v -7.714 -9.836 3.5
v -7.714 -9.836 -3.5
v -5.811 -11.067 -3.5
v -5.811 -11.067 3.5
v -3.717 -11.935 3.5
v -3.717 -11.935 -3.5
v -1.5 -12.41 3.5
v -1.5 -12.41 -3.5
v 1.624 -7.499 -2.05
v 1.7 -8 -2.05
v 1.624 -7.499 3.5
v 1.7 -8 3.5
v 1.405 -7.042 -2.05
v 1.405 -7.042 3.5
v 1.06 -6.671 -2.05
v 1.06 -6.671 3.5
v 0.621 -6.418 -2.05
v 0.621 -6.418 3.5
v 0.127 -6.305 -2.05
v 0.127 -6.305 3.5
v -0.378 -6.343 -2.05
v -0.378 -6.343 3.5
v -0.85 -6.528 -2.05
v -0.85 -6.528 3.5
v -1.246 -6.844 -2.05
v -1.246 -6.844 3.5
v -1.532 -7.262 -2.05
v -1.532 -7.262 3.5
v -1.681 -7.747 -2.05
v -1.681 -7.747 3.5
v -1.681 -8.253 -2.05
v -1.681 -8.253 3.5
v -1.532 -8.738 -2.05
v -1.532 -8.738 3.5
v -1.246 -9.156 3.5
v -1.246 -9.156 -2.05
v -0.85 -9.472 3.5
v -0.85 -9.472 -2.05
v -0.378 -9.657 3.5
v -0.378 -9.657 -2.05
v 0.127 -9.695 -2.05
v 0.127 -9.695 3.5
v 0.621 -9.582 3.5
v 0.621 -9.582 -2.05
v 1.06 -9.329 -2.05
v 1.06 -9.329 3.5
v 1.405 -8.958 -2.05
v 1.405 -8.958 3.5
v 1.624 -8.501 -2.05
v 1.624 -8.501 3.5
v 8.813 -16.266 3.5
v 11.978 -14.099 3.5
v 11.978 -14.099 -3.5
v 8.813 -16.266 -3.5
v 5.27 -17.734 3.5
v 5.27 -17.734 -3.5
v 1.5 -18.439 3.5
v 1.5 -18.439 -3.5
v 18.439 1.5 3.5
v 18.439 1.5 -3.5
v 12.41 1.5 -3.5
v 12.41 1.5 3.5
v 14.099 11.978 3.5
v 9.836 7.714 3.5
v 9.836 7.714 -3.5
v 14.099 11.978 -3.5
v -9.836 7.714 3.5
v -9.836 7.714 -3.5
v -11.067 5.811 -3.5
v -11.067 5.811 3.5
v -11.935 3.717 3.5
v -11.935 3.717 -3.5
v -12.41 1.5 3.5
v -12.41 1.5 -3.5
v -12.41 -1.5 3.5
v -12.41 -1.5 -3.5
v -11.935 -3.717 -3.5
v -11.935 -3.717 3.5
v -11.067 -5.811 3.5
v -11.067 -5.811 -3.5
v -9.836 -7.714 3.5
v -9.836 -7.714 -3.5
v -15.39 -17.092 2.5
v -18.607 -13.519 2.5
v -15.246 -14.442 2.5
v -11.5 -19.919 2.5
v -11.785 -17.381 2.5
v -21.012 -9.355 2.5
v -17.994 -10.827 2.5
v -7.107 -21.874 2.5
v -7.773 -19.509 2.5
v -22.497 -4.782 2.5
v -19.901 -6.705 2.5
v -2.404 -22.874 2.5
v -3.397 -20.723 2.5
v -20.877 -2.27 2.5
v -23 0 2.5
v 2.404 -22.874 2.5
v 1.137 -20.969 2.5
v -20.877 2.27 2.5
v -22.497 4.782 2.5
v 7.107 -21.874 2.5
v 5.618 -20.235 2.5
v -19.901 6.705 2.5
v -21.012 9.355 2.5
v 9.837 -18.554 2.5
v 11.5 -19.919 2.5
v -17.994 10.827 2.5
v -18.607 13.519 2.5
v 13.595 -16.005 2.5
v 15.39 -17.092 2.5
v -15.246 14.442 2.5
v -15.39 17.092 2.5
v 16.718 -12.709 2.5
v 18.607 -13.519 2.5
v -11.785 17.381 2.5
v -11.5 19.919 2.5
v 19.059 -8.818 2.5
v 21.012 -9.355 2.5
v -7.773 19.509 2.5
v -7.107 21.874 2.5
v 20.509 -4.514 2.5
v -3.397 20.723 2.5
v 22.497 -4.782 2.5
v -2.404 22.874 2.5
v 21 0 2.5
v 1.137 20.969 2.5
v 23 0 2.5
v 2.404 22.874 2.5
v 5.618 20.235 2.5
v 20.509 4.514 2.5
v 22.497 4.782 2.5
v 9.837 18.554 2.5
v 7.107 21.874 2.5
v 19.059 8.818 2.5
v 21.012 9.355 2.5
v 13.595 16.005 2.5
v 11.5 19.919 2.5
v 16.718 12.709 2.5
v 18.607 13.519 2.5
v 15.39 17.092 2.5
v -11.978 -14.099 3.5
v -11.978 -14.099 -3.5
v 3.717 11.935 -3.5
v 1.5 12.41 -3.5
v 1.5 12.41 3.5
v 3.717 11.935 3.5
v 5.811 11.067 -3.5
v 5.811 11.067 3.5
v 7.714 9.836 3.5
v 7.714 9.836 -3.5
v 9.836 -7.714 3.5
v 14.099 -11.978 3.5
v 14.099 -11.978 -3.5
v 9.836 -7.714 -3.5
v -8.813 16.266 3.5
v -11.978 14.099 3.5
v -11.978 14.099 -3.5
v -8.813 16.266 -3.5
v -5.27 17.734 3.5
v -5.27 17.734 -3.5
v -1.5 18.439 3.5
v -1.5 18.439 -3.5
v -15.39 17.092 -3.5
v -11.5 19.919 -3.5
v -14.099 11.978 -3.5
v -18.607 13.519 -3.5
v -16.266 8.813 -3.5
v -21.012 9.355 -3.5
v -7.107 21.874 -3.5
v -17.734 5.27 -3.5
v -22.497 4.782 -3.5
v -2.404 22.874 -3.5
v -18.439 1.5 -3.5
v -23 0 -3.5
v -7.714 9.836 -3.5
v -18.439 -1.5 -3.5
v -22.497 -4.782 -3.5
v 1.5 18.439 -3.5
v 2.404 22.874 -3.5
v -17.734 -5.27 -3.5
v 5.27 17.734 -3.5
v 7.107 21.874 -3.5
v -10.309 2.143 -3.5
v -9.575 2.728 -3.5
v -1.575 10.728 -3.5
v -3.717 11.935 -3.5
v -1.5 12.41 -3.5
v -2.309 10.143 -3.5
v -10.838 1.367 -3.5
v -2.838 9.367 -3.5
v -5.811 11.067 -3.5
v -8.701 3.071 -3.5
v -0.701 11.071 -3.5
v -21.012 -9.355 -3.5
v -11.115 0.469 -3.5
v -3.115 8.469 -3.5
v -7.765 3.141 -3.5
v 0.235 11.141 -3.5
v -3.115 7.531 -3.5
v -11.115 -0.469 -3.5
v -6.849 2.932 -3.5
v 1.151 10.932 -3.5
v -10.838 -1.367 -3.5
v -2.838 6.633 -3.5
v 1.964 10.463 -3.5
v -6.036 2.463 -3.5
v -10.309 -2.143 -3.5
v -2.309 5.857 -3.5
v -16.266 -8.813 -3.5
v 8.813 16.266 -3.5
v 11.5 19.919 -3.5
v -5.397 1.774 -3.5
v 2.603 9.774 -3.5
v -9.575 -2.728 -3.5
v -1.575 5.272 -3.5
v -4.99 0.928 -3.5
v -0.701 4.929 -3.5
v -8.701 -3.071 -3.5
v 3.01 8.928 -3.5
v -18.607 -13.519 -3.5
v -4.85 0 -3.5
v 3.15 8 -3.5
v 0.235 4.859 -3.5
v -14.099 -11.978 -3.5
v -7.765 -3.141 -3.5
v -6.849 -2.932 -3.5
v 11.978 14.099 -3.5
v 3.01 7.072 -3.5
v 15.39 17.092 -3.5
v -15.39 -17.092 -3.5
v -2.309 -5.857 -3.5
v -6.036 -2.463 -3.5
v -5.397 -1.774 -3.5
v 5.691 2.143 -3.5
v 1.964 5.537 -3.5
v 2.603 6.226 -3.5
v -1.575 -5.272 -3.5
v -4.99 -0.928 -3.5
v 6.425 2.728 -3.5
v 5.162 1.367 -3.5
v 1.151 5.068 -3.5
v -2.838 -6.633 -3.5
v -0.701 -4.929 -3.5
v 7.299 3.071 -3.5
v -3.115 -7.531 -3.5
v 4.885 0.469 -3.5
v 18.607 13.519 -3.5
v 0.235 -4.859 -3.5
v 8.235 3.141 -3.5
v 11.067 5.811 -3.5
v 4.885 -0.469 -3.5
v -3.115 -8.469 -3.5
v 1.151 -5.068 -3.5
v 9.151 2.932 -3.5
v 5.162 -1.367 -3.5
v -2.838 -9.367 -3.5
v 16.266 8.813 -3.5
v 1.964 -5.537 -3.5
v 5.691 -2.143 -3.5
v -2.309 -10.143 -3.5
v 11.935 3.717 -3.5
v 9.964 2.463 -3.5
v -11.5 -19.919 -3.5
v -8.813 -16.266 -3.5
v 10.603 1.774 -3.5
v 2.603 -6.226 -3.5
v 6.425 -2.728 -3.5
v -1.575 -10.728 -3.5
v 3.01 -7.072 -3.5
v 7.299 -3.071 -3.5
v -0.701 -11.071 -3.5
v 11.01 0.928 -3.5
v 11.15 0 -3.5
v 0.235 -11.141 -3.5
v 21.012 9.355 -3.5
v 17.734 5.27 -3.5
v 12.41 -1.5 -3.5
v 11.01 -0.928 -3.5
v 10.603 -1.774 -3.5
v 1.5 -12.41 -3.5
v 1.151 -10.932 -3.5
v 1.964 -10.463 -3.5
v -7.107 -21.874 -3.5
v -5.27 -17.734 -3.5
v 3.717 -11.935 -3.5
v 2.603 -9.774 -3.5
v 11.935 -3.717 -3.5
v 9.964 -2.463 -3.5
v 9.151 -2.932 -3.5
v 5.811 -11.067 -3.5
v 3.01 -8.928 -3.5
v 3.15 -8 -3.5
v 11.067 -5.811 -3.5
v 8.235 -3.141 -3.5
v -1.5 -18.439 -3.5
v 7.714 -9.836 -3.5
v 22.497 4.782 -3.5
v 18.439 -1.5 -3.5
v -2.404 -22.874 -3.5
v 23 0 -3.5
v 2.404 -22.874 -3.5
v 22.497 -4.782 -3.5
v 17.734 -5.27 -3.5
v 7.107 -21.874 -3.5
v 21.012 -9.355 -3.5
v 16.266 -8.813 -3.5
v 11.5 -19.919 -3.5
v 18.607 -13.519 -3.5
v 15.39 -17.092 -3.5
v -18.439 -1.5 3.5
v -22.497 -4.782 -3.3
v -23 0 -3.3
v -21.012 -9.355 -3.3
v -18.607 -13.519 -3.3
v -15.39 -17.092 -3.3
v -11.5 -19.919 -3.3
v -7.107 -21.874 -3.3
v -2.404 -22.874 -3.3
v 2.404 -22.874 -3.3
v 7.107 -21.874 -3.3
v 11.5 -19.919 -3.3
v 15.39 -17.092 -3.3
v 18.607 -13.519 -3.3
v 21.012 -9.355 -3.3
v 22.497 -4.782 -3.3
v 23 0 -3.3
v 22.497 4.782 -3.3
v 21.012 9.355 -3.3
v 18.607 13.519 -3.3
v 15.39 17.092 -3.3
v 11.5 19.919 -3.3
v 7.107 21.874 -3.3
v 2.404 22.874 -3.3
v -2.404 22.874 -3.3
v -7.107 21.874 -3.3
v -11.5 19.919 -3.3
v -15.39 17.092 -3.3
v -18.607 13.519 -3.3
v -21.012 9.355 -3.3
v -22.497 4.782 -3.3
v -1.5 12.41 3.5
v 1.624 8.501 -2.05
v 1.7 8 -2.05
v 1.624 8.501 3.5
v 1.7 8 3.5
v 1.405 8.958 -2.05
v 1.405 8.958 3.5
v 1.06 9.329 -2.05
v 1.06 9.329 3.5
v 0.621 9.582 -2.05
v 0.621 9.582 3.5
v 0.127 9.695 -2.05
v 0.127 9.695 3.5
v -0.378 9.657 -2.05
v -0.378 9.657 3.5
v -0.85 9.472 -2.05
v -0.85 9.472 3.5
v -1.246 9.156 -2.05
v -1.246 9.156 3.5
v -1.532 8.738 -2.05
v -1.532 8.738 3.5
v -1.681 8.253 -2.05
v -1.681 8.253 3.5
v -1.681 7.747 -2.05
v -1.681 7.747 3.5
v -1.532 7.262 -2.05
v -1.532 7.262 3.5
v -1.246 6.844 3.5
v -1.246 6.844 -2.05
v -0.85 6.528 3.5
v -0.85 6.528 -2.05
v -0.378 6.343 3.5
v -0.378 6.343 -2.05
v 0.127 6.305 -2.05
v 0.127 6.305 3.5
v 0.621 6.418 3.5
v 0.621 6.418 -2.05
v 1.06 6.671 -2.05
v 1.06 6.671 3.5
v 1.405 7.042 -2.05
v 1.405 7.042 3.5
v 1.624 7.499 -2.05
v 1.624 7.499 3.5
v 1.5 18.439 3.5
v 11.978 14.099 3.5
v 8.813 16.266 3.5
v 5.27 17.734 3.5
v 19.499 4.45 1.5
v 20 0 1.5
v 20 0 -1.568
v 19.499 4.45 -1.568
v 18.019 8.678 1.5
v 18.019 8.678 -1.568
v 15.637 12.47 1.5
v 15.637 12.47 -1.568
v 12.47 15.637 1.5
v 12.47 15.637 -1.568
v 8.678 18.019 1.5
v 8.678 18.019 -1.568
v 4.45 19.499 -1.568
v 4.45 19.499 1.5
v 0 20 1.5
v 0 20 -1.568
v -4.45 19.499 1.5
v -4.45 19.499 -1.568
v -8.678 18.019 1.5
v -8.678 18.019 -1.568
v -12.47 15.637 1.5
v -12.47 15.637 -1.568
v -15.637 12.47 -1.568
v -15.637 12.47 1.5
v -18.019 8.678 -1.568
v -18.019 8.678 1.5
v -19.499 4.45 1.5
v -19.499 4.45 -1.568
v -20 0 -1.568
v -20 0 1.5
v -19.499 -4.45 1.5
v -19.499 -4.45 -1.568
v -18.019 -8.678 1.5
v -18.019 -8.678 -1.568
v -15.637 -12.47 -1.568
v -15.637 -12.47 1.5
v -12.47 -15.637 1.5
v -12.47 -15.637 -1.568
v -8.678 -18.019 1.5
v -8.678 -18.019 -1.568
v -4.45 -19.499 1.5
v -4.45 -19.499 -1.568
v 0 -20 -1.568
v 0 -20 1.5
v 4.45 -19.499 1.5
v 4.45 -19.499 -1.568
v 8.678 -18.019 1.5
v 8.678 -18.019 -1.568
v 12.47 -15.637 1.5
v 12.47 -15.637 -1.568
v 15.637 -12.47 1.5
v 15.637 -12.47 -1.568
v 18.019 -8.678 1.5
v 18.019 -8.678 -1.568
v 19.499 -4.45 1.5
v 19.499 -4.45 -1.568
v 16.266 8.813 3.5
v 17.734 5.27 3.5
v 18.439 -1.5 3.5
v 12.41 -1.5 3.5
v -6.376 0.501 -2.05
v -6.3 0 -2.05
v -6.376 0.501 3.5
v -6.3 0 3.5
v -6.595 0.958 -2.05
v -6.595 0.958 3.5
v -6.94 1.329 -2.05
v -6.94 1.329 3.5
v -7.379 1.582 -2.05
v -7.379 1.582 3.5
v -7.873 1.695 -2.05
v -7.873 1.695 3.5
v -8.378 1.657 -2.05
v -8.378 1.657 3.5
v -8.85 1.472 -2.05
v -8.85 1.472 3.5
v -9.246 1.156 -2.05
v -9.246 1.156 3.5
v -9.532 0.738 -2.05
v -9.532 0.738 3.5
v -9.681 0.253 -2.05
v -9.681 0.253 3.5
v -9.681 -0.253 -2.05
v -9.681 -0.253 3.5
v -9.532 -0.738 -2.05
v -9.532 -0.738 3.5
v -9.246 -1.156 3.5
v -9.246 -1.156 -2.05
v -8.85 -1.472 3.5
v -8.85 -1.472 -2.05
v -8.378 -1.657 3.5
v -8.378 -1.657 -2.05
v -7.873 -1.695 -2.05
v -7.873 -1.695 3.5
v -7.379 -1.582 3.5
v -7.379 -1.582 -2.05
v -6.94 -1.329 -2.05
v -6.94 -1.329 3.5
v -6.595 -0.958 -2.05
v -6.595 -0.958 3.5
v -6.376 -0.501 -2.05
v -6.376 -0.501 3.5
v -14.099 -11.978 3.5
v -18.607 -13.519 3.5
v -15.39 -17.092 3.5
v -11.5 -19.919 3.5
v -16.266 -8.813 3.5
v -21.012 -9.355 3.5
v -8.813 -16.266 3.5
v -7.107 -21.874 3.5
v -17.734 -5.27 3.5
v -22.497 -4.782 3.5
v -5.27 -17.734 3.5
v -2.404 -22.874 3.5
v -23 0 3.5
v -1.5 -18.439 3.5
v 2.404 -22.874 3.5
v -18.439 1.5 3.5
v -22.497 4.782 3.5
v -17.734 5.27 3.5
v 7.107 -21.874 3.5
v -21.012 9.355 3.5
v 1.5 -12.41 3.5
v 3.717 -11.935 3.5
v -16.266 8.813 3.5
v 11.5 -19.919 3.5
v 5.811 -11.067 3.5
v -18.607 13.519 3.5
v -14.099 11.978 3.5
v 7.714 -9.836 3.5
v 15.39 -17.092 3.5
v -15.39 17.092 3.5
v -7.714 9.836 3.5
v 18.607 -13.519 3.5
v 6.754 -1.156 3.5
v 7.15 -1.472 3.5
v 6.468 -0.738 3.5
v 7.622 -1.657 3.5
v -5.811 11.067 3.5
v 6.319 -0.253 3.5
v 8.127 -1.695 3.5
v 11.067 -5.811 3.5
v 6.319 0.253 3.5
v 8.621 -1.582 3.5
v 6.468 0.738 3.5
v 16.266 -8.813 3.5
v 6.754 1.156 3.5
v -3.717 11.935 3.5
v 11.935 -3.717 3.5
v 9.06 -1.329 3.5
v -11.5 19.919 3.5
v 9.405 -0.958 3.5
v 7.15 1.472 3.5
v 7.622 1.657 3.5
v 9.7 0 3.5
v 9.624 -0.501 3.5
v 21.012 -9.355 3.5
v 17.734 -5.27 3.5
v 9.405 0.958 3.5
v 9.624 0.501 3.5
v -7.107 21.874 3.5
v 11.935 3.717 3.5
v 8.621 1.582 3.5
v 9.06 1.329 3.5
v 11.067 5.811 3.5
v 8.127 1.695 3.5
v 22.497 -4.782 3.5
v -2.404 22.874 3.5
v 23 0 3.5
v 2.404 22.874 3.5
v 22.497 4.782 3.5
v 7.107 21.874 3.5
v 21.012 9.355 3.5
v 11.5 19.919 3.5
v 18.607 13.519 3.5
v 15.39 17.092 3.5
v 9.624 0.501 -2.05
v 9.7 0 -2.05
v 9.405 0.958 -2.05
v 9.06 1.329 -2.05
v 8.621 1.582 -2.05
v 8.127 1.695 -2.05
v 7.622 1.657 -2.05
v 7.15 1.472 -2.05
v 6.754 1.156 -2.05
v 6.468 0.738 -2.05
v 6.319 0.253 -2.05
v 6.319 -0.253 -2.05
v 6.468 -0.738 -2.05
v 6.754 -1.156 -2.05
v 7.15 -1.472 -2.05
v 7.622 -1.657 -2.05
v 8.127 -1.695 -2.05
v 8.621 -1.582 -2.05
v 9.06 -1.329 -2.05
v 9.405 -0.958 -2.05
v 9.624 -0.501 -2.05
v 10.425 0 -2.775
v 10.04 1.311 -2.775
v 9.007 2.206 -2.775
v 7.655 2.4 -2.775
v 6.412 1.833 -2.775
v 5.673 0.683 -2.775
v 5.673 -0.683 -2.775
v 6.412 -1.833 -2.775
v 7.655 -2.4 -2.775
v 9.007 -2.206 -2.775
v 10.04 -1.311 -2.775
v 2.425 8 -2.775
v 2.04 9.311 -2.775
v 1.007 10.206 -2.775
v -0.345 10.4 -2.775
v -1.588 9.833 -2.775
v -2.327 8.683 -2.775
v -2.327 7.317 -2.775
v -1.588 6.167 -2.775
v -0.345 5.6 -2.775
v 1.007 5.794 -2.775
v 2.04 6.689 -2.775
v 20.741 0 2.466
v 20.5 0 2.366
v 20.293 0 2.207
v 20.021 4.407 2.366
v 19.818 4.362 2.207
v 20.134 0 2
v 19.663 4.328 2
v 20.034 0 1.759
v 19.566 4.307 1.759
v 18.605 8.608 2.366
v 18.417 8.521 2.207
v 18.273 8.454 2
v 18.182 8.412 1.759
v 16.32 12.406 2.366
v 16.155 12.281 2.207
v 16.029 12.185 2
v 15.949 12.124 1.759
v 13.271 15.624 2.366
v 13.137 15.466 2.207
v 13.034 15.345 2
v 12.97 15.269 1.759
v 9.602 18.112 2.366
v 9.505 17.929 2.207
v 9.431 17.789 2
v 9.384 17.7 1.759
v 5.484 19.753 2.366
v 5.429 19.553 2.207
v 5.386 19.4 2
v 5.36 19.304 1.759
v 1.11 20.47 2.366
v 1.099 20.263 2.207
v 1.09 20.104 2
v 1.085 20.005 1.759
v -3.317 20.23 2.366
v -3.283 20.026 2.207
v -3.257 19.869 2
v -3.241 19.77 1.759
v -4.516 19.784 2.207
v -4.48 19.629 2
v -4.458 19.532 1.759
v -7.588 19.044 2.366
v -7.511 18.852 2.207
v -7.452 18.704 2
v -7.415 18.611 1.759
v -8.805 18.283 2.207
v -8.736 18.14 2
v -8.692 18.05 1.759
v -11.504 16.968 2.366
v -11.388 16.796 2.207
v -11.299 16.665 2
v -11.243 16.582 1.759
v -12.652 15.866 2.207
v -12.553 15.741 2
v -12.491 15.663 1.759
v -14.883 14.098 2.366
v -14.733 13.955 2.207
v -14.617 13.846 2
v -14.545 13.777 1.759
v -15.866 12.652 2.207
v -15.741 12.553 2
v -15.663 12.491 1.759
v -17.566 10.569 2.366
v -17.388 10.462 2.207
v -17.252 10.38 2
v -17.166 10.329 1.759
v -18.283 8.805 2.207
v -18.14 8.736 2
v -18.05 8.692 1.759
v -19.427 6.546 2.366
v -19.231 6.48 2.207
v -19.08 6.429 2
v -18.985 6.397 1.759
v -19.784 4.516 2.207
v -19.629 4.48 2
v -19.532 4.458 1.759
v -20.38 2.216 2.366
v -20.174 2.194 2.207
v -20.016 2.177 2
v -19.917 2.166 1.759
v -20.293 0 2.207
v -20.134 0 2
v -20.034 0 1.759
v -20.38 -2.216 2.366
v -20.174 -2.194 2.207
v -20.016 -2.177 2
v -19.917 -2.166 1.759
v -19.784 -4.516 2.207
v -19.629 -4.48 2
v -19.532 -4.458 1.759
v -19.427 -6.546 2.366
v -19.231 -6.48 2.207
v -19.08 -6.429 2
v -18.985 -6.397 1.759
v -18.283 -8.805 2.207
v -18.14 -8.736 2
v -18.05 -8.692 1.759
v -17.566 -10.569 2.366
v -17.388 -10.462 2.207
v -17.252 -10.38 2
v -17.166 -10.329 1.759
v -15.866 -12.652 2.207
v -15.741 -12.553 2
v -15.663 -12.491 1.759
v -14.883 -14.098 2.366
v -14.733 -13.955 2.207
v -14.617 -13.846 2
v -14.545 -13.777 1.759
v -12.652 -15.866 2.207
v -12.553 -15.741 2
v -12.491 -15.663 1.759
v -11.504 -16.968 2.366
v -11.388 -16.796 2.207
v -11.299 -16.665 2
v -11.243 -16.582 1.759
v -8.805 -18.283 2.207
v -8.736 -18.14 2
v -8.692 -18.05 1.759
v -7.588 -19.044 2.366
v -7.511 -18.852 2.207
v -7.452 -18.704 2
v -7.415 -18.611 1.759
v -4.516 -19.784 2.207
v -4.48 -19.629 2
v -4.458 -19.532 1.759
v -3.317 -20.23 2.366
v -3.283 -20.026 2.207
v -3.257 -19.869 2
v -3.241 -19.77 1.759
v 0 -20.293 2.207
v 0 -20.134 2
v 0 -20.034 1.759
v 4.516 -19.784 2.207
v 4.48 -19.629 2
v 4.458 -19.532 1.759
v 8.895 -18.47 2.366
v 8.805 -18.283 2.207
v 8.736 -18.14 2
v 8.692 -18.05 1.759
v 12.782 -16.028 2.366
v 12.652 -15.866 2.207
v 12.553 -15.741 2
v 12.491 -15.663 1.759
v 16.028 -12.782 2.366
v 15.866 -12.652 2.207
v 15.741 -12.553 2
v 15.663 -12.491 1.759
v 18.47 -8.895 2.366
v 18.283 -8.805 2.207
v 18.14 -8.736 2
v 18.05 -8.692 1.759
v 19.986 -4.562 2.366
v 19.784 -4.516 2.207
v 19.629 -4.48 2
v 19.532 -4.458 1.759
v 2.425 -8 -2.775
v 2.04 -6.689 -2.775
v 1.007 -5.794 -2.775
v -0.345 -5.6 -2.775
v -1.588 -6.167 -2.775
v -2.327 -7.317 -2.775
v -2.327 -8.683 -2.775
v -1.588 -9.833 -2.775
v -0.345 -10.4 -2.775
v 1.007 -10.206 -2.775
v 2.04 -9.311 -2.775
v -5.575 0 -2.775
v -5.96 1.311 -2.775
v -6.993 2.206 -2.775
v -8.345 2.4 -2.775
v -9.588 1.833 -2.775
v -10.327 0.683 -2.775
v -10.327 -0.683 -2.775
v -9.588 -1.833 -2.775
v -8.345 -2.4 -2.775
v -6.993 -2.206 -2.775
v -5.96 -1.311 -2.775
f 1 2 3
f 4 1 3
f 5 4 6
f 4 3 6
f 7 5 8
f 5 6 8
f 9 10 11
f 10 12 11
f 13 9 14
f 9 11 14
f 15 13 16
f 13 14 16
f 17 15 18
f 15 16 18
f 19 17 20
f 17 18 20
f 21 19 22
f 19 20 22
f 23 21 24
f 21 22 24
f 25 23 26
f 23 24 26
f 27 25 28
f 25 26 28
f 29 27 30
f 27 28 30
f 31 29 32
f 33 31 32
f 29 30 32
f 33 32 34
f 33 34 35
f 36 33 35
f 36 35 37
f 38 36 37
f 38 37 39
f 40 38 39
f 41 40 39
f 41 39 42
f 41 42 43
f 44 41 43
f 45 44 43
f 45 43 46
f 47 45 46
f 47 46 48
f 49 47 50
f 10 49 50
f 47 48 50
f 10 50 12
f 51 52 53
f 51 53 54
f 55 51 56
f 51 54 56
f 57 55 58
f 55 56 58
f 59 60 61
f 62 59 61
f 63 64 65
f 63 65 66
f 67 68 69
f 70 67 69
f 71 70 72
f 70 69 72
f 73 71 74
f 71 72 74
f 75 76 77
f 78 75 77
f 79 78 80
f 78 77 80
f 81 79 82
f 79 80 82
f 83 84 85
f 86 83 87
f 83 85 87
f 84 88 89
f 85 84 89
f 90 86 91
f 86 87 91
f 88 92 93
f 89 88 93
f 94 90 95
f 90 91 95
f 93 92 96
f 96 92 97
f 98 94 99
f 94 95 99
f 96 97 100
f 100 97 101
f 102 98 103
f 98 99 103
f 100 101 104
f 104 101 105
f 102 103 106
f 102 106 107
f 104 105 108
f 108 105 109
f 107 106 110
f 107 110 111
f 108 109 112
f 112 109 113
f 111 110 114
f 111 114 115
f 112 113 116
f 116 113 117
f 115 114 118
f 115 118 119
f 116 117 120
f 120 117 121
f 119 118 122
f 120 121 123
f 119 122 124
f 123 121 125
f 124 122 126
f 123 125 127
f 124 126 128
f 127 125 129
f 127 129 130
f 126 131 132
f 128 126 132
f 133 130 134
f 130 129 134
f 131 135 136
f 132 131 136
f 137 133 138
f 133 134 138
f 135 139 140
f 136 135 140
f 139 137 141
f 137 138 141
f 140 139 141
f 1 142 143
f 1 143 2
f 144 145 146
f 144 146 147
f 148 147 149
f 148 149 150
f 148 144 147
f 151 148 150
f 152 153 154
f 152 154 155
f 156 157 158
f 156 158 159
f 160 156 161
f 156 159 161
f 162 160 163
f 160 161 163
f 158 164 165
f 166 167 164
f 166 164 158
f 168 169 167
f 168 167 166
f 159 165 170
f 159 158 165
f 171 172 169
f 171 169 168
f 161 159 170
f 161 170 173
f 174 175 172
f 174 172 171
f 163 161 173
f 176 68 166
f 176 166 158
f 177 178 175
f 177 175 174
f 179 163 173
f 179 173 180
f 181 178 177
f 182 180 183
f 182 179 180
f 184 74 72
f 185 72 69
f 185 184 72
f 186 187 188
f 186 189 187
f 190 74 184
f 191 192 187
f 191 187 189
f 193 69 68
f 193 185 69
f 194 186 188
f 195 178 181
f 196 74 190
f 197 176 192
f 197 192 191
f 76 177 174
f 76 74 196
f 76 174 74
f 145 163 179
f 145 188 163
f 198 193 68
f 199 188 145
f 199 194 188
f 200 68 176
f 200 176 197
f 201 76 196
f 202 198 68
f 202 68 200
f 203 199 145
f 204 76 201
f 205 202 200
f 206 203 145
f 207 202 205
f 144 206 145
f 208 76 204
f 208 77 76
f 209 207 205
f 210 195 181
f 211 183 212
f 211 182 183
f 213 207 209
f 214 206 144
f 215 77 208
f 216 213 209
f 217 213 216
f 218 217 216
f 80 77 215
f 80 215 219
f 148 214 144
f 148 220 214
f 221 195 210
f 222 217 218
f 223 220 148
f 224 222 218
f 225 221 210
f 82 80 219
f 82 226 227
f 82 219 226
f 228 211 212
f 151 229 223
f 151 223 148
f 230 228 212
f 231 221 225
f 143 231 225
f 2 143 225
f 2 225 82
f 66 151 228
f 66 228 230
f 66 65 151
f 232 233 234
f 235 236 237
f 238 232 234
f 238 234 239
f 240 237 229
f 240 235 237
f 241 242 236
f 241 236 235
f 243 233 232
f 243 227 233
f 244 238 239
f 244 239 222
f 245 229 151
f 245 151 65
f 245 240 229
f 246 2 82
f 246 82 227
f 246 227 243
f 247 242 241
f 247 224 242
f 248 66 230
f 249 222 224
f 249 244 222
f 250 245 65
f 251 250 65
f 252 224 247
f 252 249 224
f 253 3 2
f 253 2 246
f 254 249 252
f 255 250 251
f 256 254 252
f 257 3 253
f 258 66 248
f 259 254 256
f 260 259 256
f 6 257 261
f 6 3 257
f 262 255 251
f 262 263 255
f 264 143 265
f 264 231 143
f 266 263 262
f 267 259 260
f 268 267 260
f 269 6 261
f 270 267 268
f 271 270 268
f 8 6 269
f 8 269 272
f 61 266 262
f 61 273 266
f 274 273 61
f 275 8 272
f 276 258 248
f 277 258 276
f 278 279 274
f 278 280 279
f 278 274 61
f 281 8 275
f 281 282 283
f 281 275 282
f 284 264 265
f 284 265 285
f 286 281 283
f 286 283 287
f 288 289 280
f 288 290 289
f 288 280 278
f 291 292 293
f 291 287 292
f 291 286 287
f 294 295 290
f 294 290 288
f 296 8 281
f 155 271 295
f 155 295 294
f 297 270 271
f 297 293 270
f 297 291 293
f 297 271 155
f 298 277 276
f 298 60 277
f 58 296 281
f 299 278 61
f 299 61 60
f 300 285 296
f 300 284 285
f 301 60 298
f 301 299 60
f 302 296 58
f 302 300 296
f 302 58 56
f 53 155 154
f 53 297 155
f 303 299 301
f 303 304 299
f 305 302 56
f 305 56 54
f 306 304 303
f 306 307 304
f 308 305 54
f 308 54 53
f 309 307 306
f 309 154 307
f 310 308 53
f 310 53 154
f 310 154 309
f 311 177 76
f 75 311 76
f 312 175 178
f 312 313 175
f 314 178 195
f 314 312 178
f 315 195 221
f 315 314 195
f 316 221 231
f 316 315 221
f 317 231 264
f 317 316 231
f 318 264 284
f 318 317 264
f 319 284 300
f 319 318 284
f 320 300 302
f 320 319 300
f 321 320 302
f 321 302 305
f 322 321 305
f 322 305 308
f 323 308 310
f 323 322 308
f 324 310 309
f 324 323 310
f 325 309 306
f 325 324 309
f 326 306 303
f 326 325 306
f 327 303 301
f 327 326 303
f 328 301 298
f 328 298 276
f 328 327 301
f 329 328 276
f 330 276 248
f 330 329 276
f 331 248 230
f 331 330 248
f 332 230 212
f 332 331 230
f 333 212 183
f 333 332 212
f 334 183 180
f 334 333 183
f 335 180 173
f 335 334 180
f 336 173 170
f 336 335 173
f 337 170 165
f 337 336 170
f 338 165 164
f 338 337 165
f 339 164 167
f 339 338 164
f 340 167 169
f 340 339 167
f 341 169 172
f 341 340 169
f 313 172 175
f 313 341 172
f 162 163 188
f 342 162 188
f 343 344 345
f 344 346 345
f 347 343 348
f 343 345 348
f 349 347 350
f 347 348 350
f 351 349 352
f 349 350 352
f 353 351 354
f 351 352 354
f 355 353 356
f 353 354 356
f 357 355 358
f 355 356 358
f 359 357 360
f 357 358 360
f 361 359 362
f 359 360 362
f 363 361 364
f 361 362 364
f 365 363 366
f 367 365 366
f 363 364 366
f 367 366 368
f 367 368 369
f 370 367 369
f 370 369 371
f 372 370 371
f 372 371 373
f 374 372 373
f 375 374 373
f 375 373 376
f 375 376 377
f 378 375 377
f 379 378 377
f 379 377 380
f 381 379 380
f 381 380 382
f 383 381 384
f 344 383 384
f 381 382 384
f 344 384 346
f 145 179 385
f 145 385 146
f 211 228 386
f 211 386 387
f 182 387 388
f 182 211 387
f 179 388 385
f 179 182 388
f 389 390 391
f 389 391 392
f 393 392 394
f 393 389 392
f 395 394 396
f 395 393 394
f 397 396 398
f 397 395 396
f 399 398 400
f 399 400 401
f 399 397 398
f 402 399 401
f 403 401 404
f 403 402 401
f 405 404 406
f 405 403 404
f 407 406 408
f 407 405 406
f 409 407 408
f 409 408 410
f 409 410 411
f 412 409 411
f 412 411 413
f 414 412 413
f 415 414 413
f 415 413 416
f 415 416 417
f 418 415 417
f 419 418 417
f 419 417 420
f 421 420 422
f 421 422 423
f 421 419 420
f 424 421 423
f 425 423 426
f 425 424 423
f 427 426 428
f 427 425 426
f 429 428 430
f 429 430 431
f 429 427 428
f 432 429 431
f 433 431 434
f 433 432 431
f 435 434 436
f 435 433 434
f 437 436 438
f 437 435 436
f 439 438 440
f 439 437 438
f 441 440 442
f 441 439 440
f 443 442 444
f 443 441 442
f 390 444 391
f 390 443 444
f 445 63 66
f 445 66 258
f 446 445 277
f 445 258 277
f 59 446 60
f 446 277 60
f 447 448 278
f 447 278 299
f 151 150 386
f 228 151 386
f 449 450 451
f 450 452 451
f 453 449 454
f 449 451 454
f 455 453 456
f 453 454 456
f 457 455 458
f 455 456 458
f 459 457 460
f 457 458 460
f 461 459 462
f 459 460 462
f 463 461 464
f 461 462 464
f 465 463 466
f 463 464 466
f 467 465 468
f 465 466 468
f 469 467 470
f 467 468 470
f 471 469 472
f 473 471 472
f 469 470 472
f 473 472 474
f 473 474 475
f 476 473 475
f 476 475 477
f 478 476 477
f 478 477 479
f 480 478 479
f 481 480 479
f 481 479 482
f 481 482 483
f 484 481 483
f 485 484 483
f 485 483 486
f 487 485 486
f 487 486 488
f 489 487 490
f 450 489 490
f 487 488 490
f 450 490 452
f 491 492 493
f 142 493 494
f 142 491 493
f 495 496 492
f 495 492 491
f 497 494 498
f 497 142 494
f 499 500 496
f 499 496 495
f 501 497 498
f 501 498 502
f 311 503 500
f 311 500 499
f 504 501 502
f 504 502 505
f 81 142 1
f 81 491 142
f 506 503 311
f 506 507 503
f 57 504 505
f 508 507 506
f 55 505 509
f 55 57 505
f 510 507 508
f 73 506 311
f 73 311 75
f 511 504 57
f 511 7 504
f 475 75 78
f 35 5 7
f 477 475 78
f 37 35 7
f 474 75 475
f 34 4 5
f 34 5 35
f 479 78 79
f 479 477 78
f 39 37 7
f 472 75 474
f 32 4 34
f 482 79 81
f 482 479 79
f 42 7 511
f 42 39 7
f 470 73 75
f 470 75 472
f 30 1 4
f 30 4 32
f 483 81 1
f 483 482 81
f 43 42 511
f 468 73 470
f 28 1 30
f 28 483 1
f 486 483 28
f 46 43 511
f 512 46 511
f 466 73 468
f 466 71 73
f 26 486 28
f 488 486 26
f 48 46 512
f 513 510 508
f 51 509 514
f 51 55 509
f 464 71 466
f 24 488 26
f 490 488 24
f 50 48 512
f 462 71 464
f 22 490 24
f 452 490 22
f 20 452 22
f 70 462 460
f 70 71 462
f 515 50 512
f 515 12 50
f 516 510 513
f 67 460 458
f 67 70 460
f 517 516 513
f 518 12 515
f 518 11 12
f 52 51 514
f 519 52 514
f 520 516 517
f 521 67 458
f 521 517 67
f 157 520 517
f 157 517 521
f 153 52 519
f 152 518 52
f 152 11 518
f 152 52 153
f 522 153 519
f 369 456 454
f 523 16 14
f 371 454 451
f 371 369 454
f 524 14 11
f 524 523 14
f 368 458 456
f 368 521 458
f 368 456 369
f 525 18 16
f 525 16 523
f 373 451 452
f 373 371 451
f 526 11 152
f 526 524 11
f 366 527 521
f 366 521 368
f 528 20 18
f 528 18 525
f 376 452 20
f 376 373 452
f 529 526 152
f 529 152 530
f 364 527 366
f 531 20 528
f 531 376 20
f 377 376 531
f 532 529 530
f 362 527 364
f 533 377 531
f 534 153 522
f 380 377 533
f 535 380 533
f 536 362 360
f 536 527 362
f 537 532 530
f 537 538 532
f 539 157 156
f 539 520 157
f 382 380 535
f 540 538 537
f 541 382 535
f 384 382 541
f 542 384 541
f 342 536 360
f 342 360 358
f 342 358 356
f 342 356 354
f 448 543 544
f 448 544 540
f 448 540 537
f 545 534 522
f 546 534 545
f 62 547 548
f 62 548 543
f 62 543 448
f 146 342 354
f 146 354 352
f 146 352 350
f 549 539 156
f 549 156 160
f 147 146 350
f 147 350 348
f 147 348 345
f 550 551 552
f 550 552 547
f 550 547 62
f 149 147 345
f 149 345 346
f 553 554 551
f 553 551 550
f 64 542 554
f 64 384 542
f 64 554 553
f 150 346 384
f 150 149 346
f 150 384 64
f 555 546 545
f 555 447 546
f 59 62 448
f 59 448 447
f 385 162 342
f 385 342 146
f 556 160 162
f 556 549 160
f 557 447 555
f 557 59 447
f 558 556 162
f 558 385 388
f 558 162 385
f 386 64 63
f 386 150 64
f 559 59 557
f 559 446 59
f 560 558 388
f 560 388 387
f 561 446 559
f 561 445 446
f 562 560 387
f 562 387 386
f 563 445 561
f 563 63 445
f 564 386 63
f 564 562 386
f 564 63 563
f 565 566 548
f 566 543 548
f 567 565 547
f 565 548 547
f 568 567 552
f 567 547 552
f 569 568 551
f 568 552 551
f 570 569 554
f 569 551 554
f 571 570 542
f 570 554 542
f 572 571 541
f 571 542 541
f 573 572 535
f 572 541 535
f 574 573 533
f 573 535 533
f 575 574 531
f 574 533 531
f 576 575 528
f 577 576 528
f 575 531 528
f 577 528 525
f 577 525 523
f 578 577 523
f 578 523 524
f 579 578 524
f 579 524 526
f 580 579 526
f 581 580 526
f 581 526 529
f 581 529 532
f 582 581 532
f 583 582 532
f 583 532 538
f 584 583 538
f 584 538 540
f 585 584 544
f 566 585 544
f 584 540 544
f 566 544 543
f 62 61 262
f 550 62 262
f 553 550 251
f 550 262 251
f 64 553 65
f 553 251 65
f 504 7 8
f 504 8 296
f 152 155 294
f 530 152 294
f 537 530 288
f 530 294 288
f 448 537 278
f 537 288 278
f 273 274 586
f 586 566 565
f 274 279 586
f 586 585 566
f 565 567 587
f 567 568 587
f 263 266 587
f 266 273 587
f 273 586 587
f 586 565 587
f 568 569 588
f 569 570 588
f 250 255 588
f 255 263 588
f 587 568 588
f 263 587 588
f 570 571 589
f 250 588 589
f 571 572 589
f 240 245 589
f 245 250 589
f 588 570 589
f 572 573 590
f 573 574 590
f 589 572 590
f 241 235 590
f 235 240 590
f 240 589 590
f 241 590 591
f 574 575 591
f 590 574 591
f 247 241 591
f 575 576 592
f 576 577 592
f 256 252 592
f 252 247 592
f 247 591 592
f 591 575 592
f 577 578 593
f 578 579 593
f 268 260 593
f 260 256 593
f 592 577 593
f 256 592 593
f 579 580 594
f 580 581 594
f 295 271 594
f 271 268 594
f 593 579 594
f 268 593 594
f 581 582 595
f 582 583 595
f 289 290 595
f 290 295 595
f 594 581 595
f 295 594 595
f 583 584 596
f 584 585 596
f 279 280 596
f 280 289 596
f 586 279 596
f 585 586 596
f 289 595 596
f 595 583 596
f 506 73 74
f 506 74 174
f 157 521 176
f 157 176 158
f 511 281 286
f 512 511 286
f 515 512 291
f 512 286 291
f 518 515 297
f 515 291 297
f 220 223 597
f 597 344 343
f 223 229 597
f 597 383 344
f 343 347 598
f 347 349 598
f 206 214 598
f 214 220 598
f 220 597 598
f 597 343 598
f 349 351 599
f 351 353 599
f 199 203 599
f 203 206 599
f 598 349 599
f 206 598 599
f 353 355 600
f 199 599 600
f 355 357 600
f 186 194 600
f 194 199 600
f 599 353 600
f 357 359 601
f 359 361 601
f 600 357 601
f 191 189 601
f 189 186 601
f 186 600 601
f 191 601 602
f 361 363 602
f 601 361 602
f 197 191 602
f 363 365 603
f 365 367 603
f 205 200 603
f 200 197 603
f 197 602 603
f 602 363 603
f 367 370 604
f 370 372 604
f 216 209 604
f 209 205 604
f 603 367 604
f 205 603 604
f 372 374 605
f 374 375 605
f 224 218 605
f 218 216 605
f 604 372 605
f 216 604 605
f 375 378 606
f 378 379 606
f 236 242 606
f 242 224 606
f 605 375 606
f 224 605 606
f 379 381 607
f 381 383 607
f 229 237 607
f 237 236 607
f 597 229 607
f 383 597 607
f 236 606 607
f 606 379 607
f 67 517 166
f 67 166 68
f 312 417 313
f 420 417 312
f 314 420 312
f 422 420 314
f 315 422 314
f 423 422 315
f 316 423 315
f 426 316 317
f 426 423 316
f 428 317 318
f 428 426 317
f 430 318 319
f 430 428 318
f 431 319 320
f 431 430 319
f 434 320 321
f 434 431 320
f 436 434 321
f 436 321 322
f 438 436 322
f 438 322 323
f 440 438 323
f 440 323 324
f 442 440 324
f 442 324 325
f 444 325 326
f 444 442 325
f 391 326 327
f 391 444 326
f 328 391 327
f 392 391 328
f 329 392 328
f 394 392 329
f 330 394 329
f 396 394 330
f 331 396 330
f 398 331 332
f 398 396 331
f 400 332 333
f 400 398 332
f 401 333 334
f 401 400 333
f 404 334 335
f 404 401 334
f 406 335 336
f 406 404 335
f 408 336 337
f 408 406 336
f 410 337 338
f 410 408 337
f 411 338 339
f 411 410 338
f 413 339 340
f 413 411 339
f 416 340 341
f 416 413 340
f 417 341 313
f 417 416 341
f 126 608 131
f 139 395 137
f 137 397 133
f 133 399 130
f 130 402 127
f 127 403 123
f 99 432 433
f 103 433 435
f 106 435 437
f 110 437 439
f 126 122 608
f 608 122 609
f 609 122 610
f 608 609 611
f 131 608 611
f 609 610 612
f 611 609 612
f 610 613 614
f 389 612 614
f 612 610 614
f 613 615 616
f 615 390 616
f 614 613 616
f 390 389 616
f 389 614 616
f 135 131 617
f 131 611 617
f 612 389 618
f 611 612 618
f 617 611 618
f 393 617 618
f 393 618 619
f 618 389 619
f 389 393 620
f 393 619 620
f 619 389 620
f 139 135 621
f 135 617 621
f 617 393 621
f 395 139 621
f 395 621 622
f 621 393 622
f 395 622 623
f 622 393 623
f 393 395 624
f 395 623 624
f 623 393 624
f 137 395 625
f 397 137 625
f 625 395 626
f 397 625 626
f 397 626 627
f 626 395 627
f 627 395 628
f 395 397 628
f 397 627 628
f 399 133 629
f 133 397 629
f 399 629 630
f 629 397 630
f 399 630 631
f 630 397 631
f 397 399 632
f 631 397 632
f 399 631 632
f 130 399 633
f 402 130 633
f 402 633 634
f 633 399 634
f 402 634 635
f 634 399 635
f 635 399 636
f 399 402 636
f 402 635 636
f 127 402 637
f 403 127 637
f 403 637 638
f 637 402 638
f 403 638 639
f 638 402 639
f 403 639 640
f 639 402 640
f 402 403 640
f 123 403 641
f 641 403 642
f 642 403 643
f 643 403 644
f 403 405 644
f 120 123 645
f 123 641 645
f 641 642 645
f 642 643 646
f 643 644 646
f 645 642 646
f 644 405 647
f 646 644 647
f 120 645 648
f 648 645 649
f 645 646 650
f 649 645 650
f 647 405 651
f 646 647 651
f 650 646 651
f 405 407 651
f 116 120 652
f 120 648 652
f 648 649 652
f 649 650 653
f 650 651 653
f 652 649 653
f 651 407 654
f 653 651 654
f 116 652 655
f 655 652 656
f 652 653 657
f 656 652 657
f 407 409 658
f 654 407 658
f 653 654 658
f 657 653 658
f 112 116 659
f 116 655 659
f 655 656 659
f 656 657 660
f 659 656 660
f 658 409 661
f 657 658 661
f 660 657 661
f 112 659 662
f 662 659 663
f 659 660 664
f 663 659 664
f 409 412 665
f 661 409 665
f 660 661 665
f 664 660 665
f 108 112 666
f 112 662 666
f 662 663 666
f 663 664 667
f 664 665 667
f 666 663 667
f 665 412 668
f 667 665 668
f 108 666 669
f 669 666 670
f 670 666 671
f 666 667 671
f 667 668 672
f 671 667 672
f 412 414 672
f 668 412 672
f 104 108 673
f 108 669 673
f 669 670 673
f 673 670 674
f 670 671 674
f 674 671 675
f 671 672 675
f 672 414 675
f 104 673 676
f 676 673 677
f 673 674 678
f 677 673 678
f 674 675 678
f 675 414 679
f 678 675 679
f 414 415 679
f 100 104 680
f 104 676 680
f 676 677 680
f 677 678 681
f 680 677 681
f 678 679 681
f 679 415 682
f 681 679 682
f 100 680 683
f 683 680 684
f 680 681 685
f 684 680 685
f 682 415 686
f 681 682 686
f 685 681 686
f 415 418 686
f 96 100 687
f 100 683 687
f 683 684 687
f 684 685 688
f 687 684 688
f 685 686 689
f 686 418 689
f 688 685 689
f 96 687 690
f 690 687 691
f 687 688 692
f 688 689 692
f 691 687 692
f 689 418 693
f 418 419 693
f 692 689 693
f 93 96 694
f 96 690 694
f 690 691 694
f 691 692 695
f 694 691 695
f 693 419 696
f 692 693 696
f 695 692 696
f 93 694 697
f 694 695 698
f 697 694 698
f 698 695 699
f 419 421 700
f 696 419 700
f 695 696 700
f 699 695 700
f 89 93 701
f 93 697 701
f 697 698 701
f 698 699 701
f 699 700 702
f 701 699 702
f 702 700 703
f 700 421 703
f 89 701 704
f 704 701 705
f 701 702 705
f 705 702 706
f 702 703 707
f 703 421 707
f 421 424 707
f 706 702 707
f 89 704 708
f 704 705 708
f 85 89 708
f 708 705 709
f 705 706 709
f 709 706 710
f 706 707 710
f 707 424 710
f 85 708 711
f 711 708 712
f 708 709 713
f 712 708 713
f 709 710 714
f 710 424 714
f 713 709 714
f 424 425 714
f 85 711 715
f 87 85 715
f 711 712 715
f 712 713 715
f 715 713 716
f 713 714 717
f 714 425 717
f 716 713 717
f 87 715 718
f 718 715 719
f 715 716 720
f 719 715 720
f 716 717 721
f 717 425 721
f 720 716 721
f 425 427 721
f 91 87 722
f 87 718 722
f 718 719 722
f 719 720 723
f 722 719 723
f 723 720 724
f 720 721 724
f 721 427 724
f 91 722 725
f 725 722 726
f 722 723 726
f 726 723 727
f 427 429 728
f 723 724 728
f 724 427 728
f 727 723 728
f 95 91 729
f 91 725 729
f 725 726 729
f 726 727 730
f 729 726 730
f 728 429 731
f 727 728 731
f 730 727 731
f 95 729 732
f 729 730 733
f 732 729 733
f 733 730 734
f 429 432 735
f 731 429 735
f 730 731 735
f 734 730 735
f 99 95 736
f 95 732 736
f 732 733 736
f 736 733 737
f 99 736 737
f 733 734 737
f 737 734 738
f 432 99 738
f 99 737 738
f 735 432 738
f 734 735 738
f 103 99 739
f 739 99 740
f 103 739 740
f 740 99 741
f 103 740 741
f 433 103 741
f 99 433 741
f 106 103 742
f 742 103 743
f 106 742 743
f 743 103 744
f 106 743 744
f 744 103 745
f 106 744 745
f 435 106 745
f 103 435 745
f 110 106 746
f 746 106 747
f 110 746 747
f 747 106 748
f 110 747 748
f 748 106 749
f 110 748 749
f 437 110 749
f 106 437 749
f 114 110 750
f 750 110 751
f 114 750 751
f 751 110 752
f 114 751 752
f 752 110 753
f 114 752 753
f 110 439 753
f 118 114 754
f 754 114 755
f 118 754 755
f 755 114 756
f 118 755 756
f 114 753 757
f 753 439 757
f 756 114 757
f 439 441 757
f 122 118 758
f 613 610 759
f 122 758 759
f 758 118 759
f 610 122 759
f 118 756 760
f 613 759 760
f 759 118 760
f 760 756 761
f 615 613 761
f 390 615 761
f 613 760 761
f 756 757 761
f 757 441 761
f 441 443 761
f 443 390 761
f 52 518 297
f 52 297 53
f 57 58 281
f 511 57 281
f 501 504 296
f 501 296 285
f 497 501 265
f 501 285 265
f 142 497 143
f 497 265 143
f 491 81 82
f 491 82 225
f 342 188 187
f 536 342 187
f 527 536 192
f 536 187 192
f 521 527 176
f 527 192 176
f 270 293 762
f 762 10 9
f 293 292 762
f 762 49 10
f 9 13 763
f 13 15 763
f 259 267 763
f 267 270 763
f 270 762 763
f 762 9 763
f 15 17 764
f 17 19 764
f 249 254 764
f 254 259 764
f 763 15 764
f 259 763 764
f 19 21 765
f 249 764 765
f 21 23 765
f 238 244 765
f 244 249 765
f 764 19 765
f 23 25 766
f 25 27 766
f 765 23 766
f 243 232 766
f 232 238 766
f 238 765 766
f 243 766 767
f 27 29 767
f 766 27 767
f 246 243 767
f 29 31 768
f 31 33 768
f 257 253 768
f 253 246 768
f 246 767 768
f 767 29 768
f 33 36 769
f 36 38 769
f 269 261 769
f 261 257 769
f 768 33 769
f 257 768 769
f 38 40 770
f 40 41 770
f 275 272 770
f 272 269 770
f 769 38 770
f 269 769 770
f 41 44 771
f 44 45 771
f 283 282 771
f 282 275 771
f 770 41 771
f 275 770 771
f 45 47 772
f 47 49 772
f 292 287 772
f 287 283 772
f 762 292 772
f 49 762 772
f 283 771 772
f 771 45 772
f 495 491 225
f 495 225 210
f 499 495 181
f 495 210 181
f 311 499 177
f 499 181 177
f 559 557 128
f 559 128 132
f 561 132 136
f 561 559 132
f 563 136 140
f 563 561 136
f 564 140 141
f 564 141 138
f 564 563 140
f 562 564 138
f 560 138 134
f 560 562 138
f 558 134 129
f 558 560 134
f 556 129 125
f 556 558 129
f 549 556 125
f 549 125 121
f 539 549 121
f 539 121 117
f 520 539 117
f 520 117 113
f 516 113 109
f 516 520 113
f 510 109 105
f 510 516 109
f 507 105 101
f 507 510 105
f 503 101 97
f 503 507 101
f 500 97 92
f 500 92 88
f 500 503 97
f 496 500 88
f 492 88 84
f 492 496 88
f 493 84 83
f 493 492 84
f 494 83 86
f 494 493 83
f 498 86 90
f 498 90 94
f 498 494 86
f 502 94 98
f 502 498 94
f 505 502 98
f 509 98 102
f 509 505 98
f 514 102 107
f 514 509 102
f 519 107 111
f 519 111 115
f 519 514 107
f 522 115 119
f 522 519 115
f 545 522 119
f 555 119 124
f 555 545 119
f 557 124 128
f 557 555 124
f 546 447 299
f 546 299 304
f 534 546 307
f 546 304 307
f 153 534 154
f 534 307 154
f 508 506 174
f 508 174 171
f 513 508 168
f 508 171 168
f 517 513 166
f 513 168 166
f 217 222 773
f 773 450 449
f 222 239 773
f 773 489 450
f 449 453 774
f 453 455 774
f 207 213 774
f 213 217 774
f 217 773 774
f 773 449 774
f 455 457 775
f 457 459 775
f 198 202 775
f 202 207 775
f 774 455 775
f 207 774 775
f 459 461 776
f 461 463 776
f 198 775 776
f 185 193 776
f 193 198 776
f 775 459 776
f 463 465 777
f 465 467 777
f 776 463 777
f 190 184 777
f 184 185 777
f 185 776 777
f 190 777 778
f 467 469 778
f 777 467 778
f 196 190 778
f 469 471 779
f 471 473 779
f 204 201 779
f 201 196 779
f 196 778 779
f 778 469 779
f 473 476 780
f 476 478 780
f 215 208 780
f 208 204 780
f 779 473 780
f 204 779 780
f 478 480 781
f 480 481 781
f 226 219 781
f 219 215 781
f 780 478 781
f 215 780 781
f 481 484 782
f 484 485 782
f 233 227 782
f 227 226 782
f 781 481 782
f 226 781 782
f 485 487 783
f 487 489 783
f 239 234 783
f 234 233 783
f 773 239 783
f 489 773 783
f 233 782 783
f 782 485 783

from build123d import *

# Parameters (mm, degrees)
SKETCH1_R                                       = 20
BOSS_EXTRUDE1_DEPTH                             = 3.5
SKETCH4_R                                       = 23
BOSS_EXTRUDE2_DEPTH                             = 1
FILLET1_R                                       = 1
CSK_FOR_M3_FLAT_HEAD_MACHINE_SCREW1_D           = 3.4
CSK_FOR_M3_FLAT_HEAD_MACHINE_SCREW1_DEPTH       = 7
CSK_FOR_M3_FLAT_HEAD_MACHINE_SCREW1_CSINK_D     = 6.3
CSK_FOR_M3_FLAT_HEAD_MACHINE_SCREW1_CSINK_ANGLE = 90
CSK_FOR_M3_FLAT_HEAD_MACHINE_SCREW1_TIP         = 1.021463052
CUT_EXTRUDE1_DEPTH                              = 8


with BuildPart() as part:
    # Sketch1 → Boss-Extrude1 (new body, symmetric)
    with BuildSketch(Plane.XY):
        Circle(SKETCH1_R)
    extrude(amount=BOSS_EXTRUDE1_DEPTH, both=True)

    # Sketch3 → Revolve1 (revolve)
    with BuildSketch(Plane(origin=(0, 0, 0), x_dir=(1, 0, 0), z_dir=(0, 1, 0))):
        Polygon((-20, 3.5), (-23, 3.5), (-23, 3.3), (-20, 1.567949192), align=None)
    revolve(axis=Axis((0, 0, -3.5), (0, 0, 1)))

    # Sketch4 → Boss-Extrude2 (add)
    with BuildSketch(Plane.XY.offset(3.5)):
        Circle(SKETCH4_R)
    extrude(amount=-BOSS_EXTRUDE2_DEPTH)

    # Fillet1
    fillet1_edges = [part.edges().sort_by_distance(p)[0] for p in [
        (-20, 0, 2.5),
    ]]
    fillet(fillet1_edges, radius=FILLET1_R)

    # CSK for M3 Flat Head Machine Screw1
    with Locations(Plane(origin=(0, 0, -3.5), x_dir=(-1, 0, 0), z_dir=(0, 0, -1))):
        with Locations((0, 8), (-8, 0), (0, -8), (8, 0)):
            CounterSinkHole(CSK_FOR_M3_FLAT_HEAD_MACHINE_SCREW1_D / 2, CSK_FOR_M3_FLAT_HEAD_MACHINE_SCREW1_CSINK_D / 2, depth=CSK_FOR_M3_FLAT_HEAD_MACHINE_SCREW1_DEPTH, counter_sink_angle=CSK_FOR_M3_FLAT_HEAD_MACHINE_SCREW1_CSINK_ANGLE)
            with Locations((0, 0, -(CSK_FOR_M3_FLAT_HEAD_MACHINE_SCREW1_DEPTH + CSK_FOR_M3_FLAT_HEAD_MACHINE_SCREW1_TIP / 2))):  # 118° drill point
                Cone(0, CSK_FOR_M3_FLAT_HEAD_MACHINE_SCREW1_D / 2, CSK_FOR_M3_FLAT_HEAD_MACHINE_SCREW1_TIP, mode=Mode.SUBTRACT)

    # Sketch8 → Cut-Extrude1 (cut, through all)
    with BuildSketch(Plane(origin=(0, 0, -3.5), x_dir=(-1, 0, 0), z_dir=(0, 0, -1))):
        with BuildLine():
            Line((-1.5, 18.439088915), (-1.5, 12.409673646))
            ThreePointArc((-1.5, 12.409673646), (-4.783542905, 11.548494156), (-7.714304216, 9.835624559))
            Line((-7.714304216, 9.835624559), (-11.977744639, 14.099064982))
            ThreePointArc((-11.977744639, 14.099064982), (-7.079643499, 17.091771351), (-1.5, 18.439088915))
        make_face()
        with BuildLine():
            Line((1.5, 18.439088915), (1.5, 12.409673646))
            ThreePointArc((1.5, 12.409673646), (4.783542905, 11.548494156), (7.714304216, 9.835624559))
            Line((7.714304216, 9.835624559), (11.977744639, 14.099064982))
            ThreePointArc((11.977744639, 14.099064982), (7.079643499, 17.091771351), (1.5, 18.439088915))
        make_face()
        with BuildLine():
            Line((14.099064982, 11.977744639), (9.835624559, 7.714304216))
            ThreePointArc((9.835624559, 7.714304216), (11.548494156, 4.783542905), (12.409673646, 1.5))
            Line((12.409673646, 1.5), (18.439088915, 1.5))
            ThreePointArc((18.439088915, 1.5), (17.091771351, 7.079643499), (14.099064982, 11.977744639))
        make_face()
        with BuildLine():
            Line((18.439088915, -1.5), (12.409673646, -1.5))
            ThreePointArc((12.409673646, -1.5), (11.548494156, -4.783542905), (9.835624559, -7.714304216))
            Line((9.835624559, -7.714304216), (14.099064982, -11.977744639))
            ThreePointArc((14.099064982, -11.977744639), (17.091771351, -7.079643499), (18.439088915, -1.5))
        make_face()
        with BuildLine():
            Line((11.977744639, -14.099064982), (7.714304216, -9.835624559))
            ThreePointArc((7.714304216, -9.835624559), (4.783542905, -11.548494156), (1.5, -12.409673646))
            Line((1.5, -12.409673646), (1.5, -18.439088915))
            ThreePointArc((1.5, -18.439088915), (7.079643499, -17.091771351), (11.977744639, -14.099064982))
        make_face()
        with BuildLine():
            Line((-1.5, -18.439088915), (-1.5, -12.409673646))
            ThreePointArc((-1.5, -12.409673646), (-4.783542905, -11.548494156), (-7.714304216, -9.835624559))
            Line((-7.714304216, -9.835624559), (-11.977744639, -14.099064982))
            ThreePointArc((-11.977744639, -14.099064982), (-7.079643499, -17.091771351), (-1.5, -18.439088915))
        make_face()
        with BuildLine():
            Line((-14.099064982, -11.977744639), (-9.835624559, -7.714304216))
            ThreePointArc((-9.835624559, -7.714304216), (-11.548494156, -4.783542905), (-12.409673646, -1.5))
            Line((-12.409673646, -1.5), (-18.439088915, -1.5))
            ThreePointArc((-18.439088915, -1.5), (-17.091771351, -7.079643499), (-14.099064982, -11.977744639))
        make_face()
        with BuildLine():
            Line((-18.439088915, 1.5), (-12.409673646, 1.5))
            ThreePointArc((-12.409673646, 1.5), (-11.548494156, 4.783542905), (-9.835624559, 7.714304216))
            Line((-9.835624559, 7.714304216), (-14.099064982, 11.977744639))
            ThreePointArc((-14.099064982, 11.977744639), (-17.091771351, 7.079643499), (-18.439088915, 1.5))
        make_face()
    extrude(amount=-CUT_EXTRUDE1_DEPTH, mode=Mode.SUBTRACT)


solid = part.part
